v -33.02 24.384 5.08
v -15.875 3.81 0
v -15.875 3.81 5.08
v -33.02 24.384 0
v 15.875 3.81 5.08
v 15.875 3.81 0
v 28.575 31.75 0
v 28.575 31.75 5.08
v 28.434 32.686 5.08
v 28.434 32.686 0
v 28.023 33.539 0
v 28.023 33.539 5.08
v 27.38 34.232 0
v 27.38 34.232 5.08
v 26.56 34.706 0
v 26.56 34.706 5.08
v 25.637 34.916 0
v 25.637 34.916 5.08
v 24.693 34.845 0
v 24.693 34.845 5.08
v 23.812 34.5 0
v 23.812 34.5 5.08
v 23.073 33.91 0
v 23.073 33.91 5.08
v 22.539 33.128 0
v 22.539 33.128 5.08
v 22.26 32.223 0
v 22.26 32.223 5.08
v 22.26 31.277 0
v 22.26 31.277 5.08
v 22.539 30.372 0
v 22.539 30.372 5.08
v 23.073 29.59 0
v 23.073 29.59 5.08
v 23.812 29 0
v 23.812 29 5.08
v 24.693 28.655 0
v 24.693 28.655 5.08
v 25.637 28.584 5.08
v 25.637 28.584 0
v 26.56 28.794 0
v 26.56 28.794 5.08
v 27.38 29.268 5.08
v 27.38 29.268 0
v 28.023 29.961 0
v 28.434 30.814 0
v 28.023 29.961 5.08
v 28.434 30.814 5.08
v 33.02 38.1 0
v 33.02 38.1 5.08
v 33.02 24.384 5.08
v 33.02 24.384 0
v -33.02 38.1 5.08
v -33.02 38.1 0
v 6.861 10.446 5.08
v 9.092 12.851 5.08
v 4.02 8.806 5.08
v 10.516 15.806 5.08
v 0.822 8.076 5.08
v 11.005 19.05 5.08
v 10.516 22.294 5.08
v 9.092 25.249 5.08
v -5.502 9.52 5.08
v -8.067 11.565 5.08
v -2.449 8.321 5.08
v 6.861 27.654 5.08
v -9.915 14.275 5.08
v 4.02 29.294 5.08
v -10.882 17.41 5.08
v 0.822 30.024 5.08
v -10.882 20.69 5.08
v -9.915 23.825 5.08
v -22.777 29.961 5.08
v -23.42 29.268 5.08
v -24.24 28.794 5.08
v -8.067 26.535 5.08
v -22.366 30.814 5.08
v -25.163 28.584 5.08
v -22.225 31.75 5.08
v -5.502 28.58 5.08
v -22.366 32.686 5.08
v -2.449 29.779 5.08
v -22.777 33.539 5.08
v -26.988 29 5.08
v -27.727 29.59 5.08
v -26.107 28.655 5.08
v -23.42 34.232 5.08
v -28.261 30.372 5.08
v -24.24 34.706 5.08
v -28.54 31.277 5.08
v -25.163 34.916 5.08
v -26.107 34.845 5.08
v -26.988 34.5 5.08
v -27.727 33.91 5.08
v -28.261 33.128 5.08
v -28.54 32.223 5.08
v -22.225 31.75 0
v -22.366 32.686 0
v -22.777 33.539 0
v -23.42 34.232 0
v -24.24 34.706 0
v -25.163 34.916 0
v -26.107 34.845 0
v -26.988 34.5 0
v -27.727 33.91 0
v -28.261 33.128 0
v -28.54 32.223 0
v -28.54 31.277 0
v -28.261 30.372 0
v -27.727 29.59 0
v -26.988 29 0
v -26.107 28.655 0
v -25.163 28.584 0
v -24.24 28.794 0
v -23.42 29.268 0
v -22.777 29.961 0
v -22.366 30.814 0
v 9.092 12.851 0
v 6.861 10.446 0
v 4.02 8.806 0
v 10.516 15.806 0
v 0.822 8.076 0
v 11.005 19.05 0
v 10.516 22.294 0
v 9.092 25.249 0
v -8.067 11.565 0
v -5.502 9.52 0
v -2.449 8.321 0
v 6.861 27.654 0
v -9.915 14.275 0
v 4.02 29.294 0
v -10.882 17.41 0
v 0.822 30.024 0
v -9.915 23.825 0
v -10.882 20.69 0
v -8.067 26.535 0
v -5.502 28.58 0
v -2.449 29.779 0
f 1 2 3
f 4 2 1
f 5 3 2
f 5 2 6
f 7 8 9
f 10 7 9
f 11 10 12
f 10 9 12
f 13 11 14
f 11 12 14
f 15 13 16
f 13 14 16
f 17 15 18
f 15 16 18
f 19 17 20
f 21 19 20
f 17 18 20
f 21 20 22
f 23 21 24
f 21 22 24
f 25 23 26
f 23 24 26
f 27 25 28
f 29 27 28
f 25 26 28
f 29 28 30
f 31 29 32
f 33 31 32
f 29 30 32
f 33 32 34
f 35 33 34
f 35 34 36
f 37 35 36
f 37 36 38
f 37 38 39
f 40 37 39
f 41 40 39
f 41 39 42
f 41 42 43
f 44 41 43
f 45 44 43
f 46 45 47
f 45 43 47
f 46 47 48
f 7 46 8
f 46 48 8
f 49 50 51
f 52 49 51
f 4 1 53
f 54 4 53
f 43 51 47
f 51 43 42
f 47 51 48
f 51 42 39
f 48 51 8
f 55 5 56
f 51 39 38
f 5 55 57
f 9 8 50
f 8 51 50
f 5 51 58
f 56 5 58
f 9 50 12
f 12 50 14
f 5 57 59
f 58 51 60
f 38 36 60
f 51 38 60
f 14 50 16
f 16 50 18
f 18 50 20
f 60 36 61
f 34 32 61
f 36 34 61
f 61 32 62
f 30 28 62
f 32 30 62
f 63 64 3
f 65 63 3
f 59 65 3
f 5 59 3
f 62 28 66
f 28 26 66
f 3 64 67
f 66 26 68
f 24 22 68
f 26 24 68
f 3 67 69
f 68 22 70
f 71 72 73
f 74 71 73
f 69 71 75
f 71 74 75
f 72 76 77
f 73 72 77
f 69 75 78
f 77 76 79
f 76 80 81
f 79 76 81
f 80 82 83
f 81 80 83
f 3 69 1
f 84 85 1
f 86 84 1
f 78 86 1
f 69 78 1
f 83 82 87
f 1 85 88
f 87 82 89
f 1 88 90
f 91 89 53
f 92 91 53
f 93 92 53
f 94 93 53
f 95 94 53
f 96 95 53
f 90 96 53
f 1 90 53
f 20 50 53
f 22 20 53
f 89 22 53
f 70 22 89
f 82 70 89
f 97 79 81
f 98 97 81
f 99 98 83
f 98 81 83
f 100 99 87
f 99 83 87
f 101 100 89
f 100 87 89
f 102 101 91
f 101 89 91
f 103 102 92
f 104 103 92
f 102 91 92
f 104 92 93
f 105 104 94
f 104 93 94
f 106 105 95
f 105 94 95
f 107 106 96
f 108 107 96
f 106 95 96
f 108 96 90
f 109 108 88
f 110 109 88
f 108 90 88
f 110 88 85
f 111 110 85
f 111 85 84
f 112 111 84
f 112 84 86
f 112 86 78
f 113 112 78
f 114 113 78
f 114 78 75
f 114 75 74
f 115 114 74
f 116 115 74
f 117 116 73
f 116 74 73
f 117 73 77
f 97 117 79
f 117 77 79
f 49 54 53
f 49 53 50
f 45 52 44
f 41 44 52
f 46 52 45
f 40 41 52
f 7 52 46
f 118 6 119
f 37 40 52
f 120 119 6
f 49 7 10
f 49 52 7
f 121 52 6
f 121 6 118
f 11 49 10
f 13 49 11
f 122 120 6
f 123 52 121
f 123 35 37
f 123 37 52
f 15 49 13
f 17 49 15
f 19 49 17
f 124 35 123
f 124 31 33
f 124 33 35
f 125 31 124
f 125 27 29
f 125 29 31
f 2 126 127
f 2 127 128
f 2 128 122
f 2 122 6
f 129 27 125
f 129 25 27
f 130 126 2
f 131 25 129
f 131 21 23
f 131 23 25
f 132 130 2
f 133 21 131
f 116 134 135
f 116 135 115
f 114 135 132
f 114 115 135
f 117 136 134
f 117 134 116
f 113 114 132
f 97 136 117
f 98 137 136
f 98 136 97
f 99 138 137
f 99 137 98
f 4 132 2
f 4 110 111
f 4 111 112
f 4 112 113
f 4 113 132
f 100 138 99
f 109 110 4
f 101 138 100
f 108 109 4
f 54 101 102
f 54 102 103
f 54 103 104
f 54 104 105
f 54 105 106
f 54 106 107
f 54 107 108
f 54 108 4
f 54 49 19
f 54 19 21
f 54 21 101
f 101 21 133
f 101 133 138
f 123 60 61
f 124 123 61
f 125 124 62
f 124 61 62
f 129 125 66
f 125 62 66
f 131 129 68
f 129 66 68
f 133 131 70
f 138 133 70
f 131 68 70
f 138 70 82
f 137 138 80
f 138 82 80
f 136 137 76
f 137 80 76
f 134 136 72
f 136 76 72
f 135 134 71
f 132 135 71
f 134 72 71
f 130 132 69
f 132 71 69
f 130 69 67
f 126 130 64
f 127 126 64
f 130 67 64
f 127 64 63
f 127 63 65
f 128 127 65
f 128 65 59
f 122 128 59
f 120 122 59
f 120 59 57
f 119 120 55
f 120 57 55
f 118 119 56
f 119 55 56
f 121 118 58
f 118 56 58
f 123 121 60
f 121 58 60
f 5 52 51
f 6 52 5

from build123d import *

# Parameters (mm, degrees)
BOSS_EXTRUDE1_DEPTH = 5.08
SKETCH3_R           = 11.00455
SKETCH3_R_2         = 3.175
CUT_EXTRUDE2_DEPTH  = 5.08
SKETCH4_W           = 38.1
SKETCH4_H           = 3.81
CUT_EXTRUDE3_DEPTH  = 6.08


with BuildPart() as part:
    # Sketch1 → Boss-Extrude1 (new body)
    with BuildSketch(Plane.XY):
        Polygon((-44.45, 38.1), (44.45, 38.1), (12.7, 0), (-12.7, 0), align=None)
    extrude(amount=BOSS_EXTRUDE1_DEPTH)

    # Sketch3 → Cut-Extrude2 (cut)
    with BuildSketch(Plane.XY.offset(5.08)):
        with Locations((0, 19.05)):
            Circle(SKETCH3_R)
        with Locations((-25.4, 31.75)):
            Circle(SKETCH3_R_2)
        with Locations((25.4, 31.75)):
            Circle(SKETCH3_R_2)
        Polygon((-33.02, 24.384), (-33.02, 38.1), (-44.45, 38.1), align=None)
        Polygon((33.02, 38.1), (33.02, 24.384), (44.45, 38.1), align=None)
    extrude(amount=-CUT_EXTRUDE2_DEPTH, mode=Mode.SUBTRACT)

    # Sketch4 → Cut-Extrude3 (cut, through all)
    with BuildSketch(Plane.XY.offset(5.08)):
        with Locations((0, 1.905)):
            Rectangle(SKETCH4_W, SKETCH4_H)
    extrude(amount=-CUT_EXTRUDE3_DEPTH, mode=Mode.SUBTRACT)


solid = part.part
